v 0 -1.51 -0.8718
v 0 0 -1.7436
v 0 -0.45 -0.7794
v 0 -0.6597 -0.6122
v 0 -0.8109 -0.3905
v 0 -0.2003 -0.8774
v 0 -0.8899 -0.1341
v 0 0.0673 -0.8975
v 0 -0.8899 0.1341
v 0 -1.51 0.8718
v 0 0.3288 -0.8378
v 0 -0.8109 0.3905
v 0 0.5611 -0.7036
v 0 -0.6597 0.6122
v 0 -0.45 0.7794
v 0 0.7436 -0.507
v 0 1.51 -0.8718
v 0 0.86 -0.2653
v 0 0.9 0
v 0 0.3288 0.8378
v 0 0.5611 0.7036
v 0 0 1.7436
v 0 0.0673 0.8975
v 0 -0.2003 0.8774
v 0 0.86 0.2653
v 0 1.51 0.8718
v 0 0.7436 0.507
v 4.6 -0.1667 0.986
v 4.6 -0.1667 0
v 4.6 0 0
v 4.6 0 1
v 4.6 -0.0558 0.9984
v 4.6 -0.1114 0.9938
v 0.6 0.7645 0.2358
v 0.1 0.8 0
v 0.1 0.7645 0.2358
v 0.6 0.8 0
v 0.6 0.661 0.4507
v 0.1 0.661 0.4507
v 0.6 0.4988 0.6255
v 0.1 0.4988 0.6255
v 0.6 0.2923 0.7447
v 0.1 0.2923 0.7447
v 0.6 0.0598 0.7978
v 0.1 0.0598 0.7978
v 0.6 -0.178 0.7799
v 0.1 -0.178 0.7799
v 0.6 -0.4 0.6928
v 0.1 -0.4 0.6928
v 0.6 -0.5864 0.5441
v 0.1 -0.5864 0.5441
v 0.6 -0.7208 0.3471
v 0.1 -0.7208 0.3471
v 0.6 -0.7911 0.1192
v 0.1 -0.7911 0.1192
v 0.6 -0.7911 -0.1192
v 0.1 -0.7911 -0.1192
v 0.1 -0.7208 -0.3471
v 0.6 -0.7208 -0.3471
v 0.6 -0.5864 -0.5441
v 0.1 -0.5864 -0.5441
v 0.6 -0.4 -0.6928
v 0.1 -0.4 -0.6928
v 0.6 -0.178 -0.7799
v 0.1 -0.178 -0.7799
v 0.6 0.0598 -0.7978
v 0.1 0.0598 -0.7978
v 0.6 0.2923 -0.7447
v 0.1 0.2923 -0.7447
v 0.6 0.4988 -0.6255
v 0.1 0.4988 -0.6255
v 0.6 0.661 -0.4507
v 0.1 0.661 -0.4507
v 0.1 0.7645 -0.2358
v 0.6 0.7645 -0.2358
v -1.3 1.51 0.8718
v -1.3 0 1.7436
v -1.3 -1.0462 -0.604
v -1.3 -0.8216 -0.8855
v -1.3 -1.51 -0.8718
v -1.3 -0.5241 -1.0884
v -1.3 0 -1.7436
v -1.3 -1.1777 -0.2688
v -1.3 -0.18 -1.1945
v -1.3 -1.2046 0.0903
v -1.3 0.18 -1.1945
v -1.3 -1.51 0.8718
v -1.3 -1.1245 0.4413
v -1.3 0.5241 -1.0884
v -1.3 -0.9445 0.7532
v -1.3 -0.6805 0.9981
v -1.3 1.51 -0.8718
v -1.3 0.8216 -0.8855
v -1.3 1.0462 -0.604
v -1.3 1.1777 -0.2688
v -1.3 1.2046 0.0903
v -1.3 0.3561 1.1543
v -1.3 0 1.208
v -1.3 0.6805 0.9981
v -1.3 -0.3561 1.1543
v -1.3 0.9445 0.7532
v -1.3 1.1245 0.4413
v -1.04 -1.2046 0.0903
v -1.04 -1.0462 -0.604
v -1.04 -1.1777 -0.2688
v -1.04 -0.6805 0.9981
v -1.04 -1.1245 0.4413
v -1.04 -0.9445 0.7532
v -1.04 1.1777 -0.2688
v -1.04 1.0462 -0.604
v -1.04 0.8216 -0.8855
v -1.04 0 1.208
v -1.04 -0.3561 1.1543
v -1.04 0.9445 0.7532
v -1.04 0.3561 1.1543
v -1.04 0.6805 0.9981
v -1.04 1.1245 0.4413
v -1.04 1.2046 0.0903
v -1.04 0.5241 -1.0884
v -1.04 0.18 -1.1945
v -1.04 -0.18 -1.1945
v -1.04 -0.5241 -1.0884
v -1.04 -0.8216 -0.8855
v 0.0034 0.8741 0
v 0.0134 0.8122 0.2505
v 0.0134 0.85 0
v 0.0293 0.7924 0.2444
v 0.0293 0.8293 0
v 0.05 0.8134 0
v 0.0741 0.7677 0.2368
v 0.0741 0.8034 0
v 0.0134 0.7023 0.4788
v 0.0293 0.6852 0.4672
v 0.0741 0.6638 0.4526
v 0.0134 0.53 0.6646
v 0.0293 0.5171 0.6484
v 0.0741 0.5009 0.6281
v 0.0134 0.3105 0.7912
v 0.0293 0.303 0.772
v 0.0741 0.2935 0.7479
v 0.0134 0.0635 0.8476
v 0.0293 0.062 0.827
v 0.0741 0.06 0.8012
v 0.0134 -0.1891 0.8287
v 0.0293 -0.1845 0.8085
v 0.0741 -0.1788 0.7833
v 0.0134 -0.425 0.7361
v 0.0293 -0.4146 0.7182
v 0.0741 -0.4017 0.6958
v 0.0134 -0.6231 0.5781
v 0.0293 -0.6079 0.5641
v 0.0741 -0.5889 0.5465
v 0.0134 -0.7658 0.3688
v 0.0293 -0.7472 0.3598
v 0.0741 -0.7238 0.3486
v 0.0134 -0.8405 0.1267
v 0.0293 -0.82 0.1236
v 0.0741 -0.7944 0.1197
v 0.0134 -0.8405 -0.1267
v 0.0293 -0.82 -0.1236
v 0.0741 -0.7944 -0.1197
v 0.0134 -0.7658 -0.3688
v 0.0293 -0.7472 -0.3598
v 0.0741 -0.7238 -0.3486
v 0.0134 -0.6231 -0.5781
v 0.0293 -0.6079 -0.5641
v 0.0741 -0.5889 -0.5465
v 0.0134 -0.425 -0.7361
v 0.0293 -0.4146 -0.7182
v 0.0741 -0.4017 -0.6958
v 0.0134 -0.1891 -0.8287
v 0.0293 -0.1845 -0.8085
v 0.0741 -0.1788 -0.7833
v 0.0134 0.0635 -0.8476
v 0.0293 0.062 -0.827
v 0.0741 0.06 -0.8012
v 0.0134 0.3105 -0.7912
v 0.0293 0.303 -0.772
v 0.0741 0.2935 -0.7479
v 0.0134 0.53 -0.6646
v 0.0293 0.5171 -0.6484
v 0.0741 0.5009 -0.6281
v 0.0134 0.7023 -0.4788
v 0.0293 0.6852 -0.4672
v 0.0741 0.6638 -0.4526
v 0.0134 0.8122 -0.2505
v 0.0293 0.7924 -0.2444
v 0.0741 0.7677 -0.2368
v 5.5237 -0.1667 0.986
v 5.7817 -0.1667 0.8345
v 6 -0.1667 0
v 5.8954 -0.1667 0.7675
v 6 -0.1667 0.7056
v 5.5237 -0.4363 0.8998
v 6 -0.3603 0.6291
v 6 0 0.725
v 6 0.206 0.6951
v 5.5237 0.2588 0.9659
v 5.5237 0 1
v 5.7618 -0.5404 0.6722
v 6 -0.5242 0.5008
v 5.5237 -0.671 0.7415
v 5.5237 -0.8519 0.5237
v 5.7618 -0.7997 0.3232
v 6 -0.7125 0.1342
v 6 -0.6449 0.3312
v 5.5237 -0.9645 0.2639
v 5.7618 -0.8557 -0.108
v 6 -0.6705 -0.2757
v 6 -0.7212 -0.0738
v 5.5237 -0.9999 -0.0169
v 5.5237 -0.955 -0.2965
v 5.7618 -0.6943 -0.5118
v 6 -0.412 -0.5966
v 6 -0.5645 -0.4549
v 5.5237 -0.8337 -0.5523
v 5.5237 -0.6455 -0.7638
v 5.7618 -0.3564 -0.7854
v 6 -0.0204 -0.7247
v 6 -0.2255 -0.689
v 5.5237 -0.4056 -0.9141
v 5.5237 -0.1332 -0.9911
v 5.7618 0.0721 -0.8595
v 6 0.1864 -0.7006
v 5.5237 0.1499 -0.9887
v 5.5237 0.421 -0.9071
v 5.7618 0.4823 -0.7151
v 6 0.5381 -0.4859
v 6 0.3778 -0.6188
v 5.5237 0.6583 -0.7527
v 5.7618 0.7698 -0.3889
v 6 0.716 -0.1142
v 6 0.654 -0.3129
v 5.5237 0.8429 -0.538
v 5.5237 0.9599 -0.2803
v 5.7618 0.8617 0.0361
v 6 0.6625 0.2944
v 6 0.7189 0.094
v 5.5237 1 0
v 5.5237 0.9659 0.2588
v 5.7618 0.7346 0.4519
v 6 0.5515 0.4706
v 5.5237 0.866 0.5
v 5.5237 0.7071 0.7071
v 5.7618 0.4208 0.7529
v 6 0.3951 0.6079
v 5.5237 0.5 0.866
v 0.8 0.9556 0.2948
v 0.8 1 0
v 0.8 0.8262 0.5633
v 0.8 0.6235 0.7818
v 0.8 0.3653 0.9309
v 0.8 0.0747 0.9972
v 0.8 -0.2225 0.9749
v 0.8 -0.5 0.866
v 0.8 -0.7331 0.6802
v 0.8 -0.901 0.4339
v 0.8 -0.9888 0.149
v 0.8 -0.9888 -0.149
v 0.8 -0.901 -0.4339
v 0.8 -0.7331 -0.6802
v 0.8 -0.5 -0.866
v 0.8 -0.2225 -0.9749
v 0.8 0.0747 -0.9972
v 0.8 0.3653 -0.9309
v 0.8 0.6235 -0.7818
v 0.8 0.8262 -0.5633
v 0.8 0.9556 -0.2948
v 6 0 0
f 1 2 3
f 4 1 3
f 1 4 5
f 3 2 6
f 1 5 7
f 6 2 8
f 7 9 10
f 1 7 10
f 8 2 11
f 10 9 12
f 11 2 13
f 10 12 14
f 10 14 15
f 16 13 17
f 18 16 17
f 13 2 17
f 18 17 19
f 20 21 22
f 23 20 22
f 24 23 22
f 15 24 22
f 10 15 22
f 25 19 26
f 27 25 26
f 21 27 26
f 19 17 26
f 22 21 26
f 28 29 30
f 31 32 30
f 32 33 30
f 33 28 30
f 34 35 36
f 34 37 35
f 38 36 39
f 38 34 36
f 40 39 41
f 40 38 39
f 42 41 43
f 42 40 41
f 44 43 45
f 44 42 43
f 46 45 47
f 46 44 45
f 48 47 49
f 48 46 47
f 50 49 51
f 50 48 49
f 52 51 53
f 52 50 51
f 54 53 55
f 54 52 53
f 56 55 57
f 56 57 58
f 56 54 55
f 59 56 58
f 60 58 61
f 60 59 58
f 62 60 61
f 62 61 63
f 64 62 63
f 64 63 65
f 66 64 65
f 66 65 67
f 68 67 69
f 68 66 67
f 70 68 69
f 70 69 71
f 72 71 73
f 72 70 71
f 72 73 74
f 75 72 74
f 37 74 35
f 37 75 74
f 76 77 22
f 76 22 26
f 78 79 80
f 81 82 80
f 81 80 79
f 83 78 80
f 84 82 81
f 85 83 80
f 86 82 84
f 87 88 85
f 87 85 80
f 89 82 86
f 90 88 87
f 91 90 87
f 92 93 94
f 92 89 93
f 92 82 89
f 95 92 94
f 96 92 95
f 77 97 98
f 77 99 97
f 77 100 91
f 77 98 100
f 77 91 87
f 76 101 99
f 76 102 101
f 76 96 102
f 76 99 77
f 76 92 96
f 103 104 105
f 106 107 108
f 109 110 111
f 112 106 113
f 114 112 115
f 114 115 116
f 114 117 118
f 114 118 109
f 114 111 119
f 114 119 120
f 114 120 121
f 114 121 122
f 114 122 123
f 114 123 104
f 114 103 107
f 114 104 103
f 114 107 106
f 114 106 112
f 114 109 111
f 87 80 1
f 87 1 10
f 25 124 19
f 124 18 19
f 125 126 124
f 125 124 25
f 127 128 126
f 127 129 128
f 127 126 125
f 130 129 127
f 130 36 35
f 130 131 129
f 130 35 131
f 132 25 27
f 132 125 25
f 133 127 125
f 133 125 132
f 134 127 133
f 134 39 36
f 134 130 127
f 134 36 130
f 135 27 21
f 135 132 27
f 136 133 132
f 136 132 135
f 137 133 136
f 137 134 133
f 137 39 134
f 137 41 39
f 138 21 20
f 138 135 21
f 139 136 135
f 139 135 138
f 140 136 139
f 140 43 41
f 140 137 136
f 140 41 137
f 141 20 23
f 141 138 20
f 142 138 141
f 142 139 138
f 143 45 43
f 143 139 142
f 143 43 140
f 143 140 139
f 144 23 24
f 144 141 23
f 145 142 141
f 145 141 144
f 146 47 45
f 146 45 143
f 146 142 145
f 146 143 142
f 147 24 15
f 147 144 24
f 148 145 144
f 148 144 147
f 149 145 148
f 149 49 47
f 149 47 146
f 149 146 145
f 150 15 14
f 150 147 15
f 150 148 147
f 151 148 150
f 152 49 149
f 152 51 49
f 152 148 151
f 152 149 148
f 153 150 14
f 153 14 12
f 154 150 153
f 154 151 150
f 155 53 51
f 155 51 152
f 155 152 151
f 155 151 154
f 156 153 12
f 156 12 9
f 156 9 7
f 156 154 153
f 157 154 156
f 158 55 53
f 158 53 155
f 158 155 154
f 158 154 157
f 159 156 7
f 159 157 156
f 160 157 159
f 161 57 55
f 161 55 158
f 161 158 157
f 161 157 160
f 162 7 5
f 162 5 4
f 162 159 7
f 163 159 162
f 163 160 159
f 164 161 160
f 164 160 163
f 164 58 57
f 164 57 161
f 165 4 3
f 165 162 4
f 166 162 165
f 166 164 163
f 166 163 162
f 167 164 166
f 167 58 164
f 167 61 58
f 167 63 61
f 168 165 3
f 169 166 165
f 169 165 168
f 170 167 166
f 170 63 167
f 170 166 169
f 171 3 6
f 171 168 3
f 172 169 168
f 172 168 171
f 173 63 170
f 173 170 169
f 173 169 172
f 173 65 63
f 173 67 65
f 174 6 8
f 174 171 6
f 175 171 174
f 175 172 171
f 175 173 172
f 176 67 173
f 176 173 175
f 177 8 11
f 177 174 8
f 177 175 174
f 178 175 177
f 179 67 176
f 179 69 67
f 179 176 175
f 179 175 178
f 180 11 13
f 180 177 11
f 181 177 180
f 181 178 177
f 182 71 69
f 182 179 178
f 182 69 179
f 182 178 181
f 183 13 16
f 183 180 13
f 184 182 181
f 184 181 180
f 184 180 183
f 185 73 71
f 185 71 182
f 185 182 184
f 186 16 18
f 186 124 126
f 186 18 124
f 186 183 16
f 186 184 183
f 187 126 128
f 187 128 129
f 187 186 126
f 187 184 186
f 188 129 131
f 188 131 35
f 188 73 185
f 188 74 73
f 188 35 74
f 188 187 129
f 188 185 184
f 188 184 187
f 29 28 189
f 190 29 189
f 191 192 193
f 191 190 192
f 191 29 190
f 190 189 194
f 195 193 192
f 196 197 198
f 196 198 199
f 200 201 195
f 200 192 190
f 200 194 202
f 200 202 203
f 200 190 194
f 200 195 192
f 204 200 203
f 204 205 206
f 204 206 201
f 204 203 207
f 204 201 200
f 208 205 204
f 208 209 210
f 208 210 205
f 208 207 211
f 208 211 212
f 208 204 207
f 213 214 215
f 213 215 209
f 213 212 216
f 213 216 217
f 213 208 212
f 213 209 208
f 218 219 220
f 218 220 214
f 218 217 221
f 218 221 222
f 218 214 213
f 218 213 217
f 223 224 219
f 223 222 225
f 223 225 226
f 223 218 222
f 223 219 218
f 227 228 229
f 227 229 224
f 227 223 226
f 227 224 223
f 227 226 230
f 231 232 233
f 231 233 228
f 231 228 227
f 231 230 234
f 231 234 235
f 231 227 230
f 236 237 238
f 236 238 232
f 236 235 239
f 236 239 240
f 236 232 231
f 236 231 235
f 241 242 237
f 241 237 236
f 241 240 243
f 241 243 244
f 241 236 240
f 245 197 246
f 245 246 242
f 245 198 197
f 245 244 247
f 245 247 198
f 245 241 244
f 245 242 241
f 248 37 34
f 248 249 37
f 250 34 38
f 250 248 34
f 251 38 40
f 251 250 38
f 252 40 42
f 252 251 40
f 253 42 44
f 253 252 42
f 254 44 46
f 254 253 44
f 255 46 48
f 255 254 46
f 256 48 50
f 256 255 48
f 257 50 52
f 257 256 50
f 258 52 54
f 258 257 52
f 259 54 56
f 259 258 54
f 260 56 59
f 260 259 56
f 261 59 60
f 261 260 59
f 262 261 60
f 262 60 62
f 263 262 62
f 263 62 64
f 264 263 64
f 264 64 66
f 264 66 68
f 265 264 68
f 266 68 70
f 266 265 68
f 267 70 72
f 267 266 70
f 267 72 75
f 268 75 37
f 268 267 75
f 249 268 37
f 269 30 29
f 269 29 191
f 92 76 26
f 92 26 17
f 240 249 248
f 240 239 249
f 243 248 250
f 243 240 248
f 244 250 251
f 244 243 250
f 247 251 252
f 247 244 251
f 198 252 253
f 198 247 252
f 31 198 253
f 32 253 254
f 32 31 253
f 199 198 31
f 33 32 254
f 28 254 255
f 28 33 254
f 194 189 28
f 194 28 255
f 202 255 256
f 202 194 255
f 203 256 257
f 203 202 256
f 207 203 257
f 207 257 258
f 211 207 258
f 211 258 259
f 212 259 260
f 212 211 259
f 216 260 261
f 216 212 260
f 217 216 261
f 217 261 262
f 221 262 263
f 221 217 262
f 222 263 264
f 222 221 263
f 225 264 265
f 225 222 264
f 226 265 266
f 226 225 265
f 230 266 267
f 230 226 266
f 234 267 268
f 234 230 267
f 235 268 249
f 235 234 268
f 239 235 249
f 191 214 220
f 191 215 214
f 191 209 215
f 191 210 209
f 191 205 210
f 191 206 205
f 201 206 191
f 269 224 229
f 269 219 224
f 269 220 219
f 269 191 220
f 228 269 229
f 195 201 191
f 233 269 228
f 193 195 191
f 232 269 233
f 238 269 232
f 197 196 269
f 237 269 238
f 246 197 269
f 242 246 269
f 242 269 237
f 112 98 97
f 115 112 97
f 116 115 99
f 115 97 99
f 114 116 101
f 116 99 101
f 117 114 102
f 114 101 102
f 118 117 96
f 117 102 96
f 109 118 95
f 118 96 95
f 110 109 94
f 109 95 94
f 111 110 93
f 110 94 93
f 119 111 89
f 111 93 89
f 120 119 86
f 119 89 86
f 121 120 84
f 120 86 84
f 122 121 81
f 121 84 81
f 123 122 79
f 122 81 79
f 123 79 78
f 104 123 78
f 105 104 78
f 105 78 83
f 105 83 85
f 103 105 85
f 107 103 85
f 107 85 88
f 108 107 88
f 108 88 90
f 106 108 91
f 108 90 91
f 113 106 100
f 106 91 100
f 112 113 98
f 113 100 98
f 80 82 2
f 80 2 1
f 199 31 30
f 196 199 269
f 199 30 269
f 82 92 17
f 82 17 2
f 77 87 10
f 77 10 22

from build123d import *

# Parameters (mm, degrees)
EXTRUDE1_DEPTH           = 1.3
SKETCH11_W               = 1.4
SKETCH11_H               = 0.166666667
POINT_CUT_EXTRUDE8_DEPTH = 2.743597813
SKETCH16_R               = 1.208
CUT_EXTRUDE1_DEPTH       = 0.26


with BuildPart() as part:
    # Sketch1 → base-Revolve (revolve)
    with BuildSketch(Plane.XY):
        with BuildLine():
            Line((6, 1), (6, 0))
            Line((6, 0), (0, 0))
            Line((0, 0), (-1.04, 0))
            Line((-1.04, 0), (-1.3, 0))
            Line((-1.3, 0), (-1.3, 1.51))
            Line((-1.3, 1.51), (0, 1.51))
            Line((0, 1.51), (0, 0.9))
            ThreePointArc((0, 0.9), (0.029289322, 0.829289322), (0.1, 0.8))
            Line((0.1, 0.8), (0.6, 0.8))
            Line((0.6, 0.8), (0.8, 1))
            Line((0.8, 1), (6, 1))
        make_face()
    revolve(axis=Axis((0, 0, 0), (1, 0, 0)))

    # Sketch15 → Extrude1 (add)
    with BuildSketch(Plane.ZY.offset(1.3)):
        Polygon((-0.871798906, 1.51), (-1.743597813, 0), (-0.871798906, -1.51), (0.871798906, -1.51), (1.743597813, 0), (0.871798906, 1.51), align=None)
    extrude(amount=-EXTRUDE1_DEPTH)

    # Sketch8 → point_Cut-Revolve1 (revolve, cut)
    with BuildSketch(Plane.XY):
        Polygon((6, 0), (6.508, 0), (6.508, 1.508), (5.523686028, 1.508), (5.523686028, 1), (6, 0.725), align=None)
    revolve(axis=Axis((0, 0, 0), (1, 0, 0)), mode=Mode.SUBTRACT)

    # Sketch11 → point_Cut-Extrude8 (cut, through all)
    with BuildSketch(Plane.XY):
        with Locations((5.3, -0.083333334)):
            Rectangle(SKETCH11_W, SKETCH11_H)
    extrude(amount=POINT_CUT_EXTRUDE8_DEPTH, mode=Mode.SUBTRACT)

    # Sketch16 → Cut-Extrude1 (cut)
    with BuildSketch(Plane.ZY.offset(1.3)):
        Circle(SKETCH16_R)
    extrude(amount=-CUT_EXTRUDE1_DEPTH, mode=Mode.SUBTRACT)


solid = part.part
